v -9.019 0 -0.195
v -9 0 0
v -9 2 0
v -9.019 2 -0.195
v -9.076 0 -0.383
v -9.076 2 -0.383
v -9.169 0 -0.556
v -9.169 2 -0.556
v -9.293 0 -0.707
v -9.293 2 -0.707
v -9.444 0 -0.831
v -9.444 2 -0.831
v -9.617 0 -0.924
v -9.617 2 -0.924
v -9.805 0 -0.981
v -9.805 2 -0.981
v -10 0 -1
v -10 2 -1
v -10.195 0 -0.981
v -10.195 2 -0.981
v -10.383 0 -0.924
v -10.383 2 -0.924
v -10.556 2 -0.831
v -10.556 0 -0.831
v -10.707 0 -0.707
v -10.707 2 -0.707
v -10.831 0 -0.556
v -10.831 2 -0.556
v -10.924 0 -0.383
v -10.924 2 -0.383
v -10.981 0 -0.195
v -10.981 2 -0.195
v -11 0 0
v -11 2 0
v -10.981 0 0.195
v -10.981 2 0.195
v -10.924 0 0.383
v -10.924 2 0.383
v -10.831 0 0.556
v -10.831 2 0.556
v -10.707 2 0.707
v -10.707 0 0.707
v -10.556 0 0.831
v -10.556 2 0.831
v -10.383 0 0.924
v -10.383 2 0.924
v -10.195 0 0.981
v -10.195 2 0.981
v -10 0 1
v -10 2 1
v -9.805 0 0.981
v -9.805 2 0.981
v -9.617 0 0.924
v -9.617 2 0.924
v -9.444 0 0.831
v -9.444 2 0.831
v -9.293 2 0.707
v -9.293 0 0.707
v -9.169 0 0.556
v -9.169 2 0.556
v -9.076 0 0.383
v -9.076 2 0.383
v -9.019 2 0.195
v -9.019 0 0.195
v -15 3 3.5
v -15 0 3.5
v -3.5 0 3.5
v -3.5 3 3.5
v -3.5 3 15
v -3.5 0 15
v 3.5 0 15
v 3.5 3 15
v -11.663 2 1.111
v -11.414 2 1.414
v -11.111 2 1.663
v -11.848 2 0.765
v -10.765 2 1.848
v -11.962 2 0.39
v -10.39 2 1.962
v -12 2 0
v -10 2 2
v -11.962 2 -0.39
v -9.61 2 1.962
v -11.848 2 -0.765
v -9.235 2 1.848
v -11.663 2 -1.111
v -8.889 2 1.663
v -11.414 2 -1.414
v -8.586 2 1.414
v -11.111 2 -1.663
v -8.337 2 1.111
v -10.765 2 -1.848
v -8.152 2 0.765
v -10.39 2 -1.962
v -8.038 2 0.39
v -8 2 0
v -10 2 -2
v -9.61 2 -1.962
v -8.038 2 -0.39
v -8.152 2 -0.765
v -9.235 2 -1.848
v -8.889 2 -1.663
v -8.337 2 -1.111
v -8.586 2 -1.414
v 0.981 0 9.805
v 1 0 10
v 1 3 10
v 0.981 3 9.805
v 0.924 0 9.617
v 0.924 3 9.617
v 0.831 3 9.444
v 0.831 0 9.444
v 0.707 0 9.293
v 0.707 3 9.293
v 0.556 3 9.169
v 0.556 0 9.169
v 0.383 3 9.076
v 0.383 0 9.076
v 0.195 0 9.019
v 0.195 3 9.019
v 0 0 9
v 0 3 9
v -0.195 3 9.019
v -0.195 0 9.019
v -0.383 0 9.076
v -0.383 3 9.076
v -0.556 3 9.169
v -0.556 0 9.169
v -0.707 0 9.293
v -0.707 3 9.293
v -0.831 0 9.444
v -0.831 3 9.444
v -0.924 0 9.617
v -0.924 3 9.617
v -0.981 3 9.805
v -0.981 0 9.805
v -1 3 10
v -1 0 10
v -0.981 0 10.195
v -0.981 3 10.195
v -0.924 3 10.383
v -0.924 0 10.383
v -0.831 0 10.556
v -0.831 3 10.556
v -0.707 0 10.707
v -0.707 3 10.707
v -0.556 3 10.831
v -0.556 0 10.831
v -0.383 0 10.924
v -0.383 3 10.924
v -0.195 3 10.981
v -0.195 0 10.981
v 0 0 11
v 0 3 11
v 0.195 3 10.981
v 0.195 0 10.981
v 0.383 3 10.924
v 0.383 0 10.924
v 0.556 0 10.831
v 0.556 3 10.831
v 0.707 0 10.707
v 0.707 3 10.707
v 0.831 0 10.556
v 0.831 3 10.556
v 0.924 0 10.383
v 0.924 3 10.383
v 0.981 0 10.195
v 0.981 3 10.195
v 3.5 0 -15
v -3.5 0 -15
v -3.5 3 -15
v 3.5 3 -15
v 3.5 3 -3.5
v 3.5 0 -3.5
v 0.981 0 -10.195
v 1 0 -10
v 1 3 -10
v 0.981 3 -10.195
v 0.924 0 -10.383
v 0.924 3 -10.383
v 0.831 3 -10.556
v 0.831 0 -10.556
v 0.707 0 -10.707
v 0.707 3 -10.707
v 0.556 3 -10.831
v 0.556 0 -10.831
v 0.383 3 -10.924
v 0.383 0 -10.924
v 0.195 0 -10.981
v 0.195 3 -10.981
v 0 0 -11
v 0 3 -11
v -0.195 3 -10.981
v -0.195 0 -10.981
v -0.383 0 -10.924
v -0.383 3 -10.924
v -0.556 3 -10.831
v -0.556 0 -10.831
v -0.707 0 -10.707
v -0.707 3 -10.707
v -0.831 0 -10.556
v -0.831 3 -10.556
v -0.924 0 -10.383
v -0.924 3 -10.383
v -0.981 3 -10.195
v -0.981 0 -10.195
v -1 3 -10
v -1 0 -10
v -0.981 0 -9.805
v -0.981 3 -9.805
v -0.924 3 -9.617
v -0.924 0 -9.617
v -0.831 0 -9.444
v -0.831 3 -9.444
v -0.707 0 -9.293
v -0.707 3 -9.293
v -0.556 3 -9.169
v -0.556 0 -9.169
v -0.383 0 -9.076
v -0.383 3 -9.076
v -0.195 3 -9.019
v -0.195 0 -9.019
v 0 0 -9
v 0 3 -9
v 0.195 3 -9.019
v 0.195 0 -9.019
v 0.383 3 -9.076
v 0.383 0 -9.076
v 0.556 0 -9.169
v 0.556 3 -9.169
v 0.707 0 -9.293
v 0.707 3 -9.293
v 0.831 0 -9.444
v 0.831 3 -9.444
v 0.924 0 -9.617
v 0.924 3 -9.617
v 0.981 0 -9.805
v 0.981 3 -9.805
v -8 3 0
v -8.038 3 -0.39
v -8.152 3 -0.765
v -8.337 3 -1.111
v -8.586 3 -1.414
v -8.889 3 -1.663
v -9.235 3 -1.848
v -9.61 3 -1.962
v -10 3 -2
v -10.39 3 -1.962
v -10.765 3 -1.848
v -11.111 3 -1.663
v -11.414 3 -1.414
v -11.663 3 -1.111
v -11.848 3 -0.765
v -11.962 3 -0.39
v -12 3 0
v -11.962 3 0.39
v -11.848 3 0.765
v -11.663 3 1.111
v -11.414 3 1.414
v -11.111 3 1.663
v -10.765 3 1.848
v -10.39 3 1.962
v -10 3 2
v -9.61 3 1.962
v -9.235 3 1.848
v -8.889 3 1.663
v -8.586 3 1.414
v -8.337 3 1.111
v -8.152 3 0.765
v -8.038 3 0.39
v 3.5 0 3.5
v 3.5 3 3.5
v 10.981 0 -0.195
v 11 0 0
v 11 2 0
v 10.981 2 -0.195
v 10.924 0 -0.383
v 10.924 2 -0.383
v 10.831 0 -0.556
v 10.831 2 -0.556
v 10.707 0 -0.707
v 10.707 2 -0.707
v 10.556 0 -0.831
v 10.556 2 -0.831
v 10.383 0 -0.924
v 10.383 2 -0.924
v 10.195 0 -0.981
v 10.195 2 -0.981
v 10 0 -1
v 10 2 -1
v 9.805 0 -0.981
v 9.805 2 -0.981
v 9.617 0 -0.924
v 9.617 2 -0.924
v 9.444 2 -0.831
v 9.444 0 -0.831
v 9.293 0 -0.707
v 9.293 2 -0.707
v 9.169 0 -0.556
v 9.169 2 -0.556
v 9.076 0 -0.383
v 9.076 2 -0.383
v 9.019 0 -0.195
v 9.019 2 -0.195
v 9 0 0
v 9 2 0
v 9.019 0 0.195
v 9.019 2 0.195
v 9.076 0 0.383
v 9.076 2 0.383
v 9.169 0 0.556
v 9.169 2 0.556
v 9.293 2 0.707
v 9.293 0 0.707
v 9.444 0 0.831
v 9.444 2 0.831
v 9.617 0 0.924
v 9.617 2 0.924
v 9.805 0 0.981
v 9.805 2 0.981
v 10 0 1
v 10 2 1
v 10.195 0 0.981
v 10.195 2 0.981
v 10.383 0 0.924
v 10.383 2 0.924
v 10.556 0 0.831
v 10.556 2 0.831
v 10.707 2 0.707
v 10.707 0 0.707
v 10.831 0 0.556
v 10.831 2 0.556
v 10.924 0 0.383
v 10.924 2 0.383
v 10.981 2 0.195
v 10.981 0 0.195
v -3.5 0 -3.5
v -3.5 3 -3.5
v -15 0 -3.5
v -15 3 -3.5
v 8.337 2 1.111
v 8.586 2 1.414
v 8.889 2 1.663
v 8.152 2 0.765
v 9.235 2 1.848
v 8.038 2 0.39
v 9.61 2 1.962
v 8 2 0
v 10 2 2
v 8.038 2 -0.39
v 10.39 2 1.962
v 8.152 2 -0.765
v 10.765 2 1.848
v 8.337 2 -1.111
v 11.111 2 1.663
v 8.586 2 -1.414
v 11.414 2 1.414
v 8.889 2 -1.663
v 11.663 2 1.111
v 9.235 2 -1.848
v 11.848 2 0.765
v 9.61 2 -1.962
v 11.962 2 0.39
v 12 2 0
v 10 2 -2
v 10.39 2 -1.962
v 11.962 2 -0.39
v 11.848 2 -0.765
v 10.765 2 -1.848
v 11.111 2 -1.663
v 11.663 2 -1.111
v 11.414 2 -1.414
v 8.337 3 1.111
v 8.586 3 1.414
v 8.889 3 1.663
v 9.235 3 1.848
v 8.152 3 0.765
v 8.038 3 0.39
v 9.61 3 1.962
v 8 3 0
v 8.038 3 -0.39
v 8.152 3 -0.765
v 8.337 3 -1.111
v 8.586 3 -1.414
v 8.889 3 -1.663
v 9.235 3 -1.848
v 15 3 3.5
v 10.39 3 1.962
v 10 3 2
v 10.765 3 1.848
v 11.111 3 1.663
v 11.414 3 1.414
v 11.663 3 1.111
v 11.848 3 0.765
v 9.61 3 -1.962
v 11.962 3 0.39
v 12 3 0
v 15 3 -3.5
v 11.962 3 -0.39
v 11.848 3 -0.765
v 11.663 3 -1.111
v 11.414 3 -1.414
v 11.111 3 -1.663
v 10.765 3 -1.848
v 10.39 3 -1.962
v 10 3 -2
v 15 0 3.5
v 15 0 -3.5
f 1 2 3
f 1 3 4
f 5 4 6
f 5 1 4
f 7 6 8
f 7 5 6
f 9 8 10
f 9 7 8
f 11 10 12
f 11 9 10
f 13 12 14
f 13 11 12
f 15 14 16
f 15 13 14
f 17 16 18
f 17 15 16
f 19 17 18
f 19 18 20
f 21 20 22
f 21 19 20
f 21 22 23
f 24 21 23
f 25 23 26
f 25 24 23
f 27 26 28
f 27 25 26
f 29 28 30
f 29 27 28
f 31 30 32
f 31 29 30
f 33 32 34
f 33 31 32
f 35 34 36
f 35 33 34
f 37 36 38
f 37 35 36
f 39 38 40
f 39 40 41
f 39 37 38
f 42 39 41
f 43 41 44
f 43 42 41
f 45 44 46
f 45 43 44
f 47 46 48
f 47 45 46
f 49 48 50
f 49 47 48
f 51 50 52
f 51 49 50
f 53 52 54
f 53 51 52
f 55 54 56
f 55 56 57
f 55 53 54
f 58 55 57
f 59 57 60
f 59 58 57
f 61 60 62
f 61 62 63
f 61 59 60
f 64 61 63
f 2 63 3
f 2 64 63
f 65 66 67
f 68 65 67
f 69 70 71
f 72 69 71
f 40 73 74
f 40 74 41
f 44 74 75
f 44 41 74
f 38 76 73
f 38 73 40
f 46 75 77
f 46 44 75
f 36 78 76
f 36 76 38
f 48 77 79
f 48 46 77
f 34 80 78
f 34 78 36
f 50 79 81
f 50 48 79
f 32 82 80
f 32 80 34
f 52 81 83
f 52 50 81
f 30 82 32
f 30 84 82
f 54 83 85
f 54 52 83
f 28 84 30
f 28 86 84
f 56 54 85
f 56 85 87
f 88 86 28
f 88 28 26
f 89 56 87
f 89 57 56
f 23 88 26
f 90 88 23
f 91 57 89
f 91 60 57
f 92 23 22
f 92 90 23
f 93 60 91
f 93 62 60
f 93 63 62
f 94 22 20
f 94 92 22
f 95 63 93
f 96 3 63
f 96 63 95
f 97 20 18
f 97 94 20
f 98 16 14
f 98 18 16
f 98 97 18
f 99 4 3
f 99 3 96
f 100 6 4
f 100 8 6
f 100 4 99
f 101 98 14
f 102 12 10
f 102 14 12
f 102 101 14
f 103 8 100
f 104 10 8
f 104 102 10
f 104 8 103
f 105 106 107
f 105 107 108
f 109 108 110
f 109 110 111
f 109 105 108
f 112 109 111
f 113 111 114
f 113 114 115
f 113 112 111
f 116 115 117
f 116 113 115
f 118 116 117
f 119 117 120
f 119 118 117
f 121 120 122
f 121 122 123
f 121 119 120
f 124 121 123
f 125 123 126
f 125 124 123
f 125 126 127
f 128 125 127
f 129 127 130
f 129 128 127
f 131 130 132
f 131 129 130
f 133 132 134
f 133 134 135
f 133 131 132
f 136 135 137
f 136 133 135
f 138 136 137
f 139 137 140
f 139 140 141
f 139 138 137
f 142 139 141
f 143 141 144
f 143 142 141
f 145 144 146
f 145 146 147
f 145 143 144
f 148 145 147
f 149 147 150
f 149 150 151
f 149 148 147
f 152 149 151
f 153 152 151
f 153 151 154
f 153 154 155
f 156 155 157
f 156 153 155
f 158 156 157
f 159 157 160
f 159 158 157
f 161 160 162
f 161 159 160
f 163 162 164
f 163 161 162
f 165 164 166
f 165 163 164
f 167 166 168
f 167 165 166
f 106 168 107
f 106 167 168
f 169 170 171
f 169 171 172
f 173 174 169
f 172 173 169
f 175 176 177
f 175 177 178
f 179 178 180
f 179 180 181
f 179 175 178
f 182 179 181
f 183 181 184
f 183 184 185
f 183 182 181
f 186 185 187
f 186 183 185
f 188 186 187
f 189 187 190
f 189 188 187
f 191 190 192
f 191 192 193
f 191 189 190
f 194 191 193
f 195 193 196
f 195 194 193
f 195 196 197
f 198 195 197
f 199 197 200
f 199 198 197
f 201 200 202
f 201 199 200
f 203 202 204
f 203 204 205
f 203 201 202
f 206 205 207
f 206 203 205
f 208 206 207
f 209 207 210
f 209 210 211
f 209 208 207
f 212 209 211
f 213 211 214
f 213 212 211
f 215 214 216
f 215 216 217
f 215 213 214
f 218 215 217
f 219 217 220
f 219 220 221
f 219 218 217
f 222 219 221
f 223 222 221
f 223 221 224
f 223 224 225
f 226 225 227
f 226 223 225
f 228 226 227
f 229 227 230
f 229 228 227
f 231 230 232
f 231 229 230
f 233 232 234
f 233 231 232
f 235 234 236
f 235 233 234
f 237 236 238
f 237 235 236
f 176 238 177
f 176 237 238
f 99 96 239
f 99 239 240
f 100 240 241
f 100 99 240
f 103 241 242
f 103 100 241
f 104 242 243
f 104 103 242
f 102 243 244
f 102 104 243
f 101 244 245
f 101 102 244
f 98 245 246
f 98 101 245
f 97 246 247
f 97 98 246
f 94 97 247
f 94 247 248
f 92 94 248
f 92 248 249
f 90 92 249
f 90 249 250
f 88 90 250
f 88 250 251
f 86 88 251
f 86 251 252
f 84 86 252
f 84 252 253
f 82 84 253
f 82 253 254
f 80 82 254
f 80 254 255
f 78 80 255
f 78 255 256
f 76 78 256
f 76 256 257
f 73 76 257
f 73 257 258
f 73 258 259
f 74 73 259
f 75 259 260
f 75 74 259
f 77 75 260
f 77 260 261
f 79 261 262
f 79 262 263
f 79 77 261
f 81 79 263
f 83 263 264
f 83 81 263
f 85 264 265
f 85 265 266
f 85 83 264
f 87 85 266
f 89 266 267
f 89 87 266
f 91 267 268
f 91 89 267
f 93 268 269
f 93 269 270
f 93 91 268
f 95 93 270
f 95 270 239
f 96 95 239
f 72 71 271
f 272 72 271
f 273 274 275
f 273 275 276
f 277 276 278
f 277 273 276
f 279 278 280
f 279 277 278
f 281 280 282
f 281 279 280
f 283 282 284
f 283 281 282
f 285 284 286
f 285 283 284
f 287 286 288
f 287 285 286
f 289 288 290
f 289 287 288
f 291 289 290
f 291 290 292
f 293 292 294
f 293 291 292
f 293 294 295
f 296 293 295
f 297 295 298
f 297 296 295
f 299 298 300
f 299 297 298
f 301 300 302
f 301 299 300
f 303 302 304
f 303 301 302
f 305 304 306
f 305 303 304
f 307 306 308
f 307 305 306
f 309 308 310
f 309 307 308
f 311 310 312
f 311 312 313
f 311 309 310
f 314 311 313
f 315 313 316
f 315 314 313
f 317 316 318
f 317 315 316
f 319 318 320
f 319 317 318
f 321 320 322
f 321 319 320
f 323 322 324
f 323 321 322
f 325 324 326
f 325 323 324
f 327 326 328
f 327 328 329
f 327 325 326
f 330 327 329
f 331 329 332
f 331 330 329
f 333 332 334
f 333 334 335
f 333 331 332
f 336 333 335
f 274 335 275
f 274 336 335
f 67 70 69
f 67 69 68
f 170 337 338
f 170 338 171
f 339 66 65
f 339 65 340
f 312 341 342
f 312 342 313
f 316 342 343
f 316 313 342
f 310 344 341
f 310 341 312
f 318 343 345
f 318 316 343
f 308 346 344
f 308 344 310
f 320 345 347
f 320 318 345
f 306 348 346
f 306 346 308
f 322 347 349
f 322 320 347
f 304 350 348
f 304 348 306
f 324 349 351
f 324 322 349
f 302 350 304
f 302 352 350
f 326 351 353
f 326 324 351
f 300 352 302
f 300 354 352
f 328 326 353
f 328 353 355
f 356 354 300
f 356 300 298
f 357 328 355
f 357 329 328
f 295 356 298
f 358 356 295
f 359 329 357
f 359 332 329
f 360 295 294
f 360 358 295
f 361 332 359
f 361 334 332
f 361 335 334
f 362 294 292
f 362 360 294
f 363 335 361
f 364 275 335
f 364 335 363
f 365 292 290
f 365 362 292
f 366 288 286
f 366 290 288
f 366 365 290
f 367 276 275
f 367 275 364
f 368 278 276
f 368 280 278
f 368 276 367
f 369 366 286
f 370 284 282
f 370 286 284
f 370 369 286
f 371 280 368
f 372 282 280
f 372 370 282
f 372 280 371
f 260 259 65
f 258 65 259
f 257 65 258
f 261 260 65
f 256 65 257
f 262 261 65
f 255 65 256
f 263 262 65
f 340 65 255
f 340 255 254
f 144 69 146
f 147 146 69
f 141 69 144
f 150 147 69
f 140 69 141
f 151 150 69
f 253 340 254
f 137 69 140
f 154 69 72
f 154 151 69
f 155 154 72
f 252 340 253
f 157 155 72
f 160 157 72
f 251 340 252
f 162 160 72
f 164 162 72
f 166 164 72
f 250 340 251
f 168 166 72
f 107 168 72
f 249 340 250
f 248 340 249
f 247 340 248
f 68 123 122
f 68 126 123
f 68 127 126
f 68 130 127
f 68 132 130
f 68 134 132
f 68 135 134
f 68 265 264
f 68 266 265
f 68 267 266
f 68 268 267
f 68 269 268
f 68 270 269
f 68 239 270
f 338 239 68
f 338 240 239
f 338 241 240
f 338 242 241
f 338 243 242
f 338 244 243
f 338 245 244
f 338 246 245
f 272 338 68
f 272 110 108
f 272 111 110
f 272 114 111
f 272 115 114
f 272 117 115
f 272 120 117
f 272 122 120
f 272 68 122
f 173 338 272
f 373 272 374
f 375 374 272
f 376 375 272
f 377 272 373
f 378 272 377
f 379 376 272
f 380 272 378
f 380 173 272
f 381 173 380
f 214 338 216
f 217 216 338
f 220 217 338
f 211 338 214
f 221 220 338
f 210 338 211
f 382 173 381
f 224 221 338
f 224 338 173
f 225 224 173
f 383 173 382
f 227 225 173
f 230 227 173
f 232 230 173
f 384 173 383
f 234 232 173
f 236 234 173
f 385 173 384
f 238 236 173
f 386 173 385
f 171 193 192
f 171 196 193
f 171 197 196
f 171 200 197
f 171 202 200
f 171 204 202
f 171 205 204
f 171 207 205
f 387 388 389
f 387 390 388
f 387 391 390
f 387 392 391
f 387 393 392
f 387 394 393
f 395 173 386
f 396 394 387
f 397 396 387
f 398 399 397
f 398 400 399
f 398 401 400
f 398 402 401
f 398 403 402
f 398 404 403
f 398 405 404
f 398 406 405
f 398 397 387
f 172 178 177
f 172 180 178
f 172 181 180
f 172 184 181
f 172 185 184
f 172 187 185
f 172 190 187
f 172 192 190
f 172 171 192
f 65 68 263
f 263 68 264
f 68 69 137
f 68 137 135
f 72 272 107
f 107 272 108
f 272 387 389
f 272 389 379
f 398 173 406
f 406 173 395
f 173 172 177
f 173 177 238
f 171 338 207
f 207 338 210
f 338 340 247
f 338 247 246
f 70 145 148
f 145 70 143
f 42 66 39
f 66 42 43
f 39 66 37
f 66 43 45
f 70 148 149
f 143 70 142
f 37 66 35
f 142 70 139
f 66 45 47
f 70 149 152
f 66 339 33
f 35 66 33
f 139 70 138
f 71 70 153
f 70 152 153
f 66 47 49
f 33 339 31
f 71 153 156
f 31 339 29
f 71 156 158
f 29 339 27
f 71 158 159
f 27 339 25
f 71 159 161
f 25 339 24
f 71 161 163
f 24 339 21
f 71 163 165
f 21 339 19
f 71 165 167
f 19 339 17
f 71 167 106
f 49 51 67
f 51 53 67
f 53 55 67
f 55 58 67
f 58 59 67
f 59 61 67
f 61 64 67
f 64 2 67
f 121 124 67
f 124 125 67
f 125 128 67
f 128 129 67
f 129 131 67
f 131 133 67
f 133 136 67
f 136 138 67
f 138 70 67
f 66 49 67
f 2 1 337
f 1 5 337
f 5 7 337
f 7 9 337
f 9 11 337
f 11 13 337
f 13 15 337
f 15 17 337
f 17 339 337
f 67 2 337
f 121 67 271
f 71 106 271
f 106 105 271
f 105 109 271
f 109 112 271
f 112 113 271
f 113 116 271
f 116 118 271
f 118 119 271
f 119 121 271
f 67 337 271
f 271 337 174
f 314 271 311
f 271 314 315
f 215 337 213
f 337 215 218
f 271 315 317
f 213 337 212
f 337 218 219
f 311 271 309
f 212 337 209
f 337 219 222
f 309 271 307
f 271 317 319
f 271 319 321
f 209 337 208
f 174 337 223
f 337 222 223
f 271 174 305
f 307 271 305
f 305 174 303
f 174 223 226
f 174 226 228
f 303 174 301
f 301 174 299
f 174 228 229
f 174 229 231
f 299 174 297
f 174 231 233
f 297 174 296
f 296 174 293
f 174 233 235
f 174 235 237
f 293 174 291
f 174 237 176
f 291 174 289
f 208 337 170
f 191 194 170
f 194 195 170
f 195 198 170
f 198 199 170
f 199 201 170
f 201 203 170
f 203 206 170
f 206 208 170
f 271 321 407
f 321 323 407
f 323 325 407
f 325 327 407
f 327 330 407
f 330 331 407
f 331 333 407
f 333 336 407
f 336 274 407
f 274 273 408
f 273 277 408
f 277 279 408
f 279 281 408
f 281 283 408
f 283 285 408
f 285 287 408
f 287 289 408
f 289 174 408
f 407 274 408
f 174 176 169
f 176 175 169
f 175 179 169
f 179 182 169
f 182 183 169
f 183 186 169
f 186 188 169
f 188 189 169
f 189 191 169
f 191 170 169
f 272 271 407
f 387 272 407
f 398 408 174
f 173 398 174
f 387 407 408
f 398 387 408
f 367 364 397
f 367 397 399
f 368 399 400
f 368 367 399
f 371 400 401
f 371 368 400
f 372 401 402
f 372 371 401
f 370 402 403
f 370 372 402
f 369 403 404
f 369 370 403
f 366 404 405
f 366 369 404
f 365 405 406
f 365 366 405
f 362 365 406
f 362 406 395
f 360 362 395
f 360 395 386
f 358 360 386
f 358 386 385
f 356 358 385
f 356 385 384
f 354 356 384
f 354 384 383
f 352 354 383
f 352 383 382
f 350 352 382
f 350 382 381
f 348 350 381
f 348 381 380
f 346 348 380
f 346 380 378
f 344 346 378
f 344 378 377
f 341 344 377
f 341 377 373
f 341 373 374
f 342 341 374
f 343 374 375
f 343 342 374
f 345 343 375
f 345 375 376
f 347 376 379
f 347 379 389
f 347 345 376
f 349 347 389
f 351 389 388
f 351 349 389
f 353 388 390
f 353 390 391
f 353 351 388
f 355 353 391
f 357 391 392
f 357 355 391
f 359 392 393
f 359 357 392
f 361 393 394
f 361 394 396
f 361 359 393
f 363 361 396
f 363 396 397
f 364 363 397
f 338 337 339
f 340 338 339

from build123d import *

# Parameters (mm, degrees)
SKETCH1_R           = 2
SKETCH1_R_2         = 1
BOSS_EXTRUDE1_DEPTH = 3
SKETCH1_3_R         = 2
SKETCH1_3_R_2       = 1
BOSS_EXTRUDE2_DEPTH = 2


with BuildPart() as part:
    # Sketch1 → Boss-Extrude1 (new body)
    with BuildSketch(Plane(origin=(0, 0, 0), x_dir=(1, 0, 0), z_dir=(0, 1, 0))):
        Polygon((-3.5, 3.5), (-15, 3.5), (-15, -3.5), (-3.5, -3.5), (-3.5, -15), (3.5, -15), (3.5, -3.5), (15, -3.5), (15, 3.5), (3.5, 3.5), (3.5, 15), (-3.5, 15), align=None)
        with Locations((-10, 0)):
            Circle(SKETCH1_R, mode=Mode.SUBTRACT)
        with Locations((10, 0)):
            Circle(SKETCH1_R, mode=Mode.SUBTRACT)
        with Locations((0, 10)):
            Circle(SKETCH1_R_2, mode=Mode.SUBTRACT)
        with Locations((0, -10)):
            Circle(SKETCH1_R_2, mode=Mode.SUBTRACT)
    extrude(amount=BOSS_EXTRUDE1_DEPTH)

    # Sketch1<3> → Boss-Extrude2 (add)
    # profile 1 of 2: a face of its own
    with BuildSketch(Plane(origin=(0, 0, 0), x_dir=(1, 0, 0), z_dir=(0, 1, 0))):
        with Locations((10, 0)):
            Circle(SKETCH1_3_R)
        with Locations((10, 0)):
            Circle(SKETCH1_3_R_2, mode=Mode.SUBTRACT)
    # profile 2 of 2: a face of its own
    with BuildSketch(Plane(origin=(0, 0, 0), x_dir=(1, 0, 0), z_dir=(0, 1, 0))):
        with Locations((-10, 0)):
            Circle(SKETCH1_3_R)
        with Locations((-10, 0)):
            Circle(SKETCH1_3_R_2, mode=Mode.SUBTRACT)
    extrude(amount=BOSS_EXTRUDE2_DEPTH)


solid = part.part
